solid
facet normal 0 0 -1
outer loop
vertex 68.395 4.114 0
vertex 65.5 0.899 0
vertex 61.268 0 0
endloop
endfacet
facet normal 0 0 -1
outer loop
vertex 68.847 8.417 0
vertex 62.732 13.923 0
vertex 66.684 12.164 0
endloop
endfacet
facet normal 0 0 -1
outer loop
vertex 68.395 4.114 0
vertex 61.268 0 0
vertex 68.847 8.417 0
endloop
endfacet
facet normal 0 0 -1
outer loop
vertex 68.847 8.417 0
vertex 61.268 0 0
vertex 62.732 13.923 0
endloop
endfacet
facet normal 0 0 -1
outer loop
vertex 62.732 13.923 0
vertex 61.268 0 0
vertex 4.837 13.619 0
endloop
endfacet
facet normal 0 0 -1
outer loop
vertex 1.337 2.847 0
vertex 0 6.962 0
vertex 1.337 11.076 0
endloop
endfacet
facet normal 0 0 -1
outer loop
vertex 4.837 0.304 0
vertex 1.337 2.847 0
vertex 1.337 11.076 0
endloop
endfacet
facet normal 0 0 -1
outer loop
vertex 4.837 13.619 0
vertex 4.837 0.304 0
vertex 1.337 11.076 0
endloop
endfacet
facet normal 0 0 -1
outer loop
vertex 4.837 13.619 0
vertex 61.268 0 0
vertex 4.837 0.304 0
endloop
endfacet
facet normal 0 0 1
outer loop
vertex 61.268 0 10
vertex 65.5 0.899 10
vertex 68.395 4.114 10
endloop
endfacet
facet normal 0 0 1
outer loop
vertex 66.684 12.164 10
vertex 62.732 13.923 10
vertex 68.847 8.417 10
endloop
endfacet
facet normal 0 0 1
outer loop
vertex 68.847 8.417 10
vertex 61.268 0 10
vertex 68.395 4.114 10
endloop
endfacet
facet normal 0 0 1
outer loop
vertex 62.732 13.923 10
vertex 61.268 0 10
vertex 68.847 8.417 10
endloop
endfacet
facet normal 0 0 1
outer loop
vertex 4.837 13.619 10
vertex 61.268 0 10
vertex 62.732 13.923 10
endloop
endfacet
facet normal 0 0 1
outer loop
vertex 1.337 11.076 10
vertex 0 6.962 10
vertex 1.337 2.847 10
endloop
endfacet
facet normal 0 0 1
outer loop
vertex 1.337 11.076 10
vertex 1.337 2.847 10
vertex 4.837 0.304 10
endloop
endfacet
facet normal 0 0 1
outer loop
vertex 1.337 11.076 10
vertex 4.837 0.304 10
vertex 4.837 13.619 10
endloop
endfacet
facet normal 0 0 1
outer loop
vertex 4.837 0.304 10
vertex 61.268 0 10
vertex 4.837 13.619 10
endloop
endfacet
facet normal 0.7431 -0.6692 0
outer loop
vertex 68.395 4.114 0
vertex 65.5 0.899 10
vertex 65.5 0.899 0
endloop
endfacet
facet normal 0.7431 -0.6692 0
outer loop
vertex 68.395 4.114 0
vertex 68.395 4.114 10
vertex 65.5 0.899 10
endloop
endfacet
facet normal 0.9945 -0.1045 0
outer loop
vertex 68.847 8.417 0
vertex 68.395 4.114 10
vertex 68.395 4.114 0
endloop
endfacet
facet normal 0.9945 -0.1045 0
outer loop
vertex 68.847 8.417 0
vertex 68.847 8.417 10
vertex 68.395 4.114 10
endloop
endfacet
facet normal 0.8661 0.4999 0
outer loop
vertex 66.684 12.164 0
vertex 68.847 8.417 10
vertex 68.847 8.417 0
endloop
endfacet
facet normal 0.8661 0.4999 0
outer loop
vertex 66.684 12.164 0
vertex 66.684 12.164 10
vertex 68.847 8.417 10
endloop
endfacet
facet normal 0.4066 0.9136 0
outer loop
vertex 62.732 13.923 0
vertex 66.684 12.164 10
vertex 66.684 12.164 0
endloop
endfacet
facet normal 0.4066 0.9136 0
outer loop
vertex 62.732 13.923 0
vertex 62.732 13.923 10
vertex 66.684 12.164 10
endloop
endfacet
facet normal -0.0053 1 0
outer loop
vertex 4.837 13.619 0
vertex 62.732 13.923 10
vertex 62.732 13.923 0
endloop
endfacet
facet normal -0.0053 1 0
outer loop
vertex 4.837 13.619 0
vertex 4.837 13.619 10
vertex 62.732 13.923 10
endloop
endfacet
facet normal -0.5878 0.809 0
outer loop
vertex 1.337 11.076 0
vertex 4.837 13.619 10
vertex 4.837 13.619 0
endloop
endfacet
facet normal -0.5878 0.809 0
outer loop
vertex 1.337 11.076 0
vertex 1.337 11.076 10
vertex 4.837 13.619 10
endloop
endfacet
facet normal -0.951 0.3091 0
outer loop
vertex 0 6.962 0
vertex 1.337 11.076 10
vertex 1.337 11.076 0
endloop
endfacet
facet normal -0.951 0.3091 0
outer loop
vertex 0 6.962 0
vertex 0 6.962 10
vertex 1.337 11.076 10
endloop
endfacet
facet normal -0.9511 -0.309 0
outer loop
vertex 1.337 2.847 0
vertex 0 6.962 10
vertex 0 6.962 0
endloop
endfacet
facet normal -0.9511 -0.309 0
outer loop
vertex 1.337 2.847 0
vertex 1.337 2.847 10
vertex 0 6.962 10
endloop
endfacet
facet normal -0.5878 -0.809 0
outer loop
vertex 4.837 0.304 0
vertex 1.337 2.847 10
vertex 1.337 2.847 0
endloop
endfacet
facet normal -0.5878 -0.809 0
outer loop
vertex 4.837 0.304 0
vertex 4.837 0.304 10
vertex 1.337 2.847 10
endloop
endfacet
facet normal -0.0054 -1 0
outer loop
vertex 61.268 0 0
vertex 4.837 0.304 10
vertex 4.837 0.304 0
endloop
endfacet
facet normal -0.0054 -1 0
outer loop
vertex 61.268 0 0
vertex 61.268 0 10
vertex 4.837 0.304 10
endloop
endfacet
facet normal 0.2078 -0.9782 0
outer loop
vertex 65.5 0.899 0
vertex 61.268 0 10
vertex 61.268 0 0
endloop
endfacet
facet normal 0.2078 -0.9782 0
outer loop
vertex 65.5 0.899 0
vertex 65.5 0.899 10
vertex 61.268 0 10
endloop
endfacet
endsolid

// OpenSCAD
$fn = 32;

// ----------------------------------------------------------------------
// Lever arm: two bosses 14 and 14 mm, 55 mm between centres
// ----------------------------------------------------------------------

// --- parameters (mm) ---
profile_height = 10;      // extrusion height
profile_points = 11;      // points of the closed outline

profile = [[0, 6.962], [1.337, 2.847], [4.837, 0.304], [61.268, 0], [65.5, 0.899], [68.395, 4.114], [68.847, 8.417], [66.684, 12.164], [62.732, 13.923], [4.837, 13.619], [1.337, 11.076]];  // single closed polygon, 11 points, counter clockwise

// --- the one profile operation ---
linear_extrude(height = profile_height) polygon(points = profile);
